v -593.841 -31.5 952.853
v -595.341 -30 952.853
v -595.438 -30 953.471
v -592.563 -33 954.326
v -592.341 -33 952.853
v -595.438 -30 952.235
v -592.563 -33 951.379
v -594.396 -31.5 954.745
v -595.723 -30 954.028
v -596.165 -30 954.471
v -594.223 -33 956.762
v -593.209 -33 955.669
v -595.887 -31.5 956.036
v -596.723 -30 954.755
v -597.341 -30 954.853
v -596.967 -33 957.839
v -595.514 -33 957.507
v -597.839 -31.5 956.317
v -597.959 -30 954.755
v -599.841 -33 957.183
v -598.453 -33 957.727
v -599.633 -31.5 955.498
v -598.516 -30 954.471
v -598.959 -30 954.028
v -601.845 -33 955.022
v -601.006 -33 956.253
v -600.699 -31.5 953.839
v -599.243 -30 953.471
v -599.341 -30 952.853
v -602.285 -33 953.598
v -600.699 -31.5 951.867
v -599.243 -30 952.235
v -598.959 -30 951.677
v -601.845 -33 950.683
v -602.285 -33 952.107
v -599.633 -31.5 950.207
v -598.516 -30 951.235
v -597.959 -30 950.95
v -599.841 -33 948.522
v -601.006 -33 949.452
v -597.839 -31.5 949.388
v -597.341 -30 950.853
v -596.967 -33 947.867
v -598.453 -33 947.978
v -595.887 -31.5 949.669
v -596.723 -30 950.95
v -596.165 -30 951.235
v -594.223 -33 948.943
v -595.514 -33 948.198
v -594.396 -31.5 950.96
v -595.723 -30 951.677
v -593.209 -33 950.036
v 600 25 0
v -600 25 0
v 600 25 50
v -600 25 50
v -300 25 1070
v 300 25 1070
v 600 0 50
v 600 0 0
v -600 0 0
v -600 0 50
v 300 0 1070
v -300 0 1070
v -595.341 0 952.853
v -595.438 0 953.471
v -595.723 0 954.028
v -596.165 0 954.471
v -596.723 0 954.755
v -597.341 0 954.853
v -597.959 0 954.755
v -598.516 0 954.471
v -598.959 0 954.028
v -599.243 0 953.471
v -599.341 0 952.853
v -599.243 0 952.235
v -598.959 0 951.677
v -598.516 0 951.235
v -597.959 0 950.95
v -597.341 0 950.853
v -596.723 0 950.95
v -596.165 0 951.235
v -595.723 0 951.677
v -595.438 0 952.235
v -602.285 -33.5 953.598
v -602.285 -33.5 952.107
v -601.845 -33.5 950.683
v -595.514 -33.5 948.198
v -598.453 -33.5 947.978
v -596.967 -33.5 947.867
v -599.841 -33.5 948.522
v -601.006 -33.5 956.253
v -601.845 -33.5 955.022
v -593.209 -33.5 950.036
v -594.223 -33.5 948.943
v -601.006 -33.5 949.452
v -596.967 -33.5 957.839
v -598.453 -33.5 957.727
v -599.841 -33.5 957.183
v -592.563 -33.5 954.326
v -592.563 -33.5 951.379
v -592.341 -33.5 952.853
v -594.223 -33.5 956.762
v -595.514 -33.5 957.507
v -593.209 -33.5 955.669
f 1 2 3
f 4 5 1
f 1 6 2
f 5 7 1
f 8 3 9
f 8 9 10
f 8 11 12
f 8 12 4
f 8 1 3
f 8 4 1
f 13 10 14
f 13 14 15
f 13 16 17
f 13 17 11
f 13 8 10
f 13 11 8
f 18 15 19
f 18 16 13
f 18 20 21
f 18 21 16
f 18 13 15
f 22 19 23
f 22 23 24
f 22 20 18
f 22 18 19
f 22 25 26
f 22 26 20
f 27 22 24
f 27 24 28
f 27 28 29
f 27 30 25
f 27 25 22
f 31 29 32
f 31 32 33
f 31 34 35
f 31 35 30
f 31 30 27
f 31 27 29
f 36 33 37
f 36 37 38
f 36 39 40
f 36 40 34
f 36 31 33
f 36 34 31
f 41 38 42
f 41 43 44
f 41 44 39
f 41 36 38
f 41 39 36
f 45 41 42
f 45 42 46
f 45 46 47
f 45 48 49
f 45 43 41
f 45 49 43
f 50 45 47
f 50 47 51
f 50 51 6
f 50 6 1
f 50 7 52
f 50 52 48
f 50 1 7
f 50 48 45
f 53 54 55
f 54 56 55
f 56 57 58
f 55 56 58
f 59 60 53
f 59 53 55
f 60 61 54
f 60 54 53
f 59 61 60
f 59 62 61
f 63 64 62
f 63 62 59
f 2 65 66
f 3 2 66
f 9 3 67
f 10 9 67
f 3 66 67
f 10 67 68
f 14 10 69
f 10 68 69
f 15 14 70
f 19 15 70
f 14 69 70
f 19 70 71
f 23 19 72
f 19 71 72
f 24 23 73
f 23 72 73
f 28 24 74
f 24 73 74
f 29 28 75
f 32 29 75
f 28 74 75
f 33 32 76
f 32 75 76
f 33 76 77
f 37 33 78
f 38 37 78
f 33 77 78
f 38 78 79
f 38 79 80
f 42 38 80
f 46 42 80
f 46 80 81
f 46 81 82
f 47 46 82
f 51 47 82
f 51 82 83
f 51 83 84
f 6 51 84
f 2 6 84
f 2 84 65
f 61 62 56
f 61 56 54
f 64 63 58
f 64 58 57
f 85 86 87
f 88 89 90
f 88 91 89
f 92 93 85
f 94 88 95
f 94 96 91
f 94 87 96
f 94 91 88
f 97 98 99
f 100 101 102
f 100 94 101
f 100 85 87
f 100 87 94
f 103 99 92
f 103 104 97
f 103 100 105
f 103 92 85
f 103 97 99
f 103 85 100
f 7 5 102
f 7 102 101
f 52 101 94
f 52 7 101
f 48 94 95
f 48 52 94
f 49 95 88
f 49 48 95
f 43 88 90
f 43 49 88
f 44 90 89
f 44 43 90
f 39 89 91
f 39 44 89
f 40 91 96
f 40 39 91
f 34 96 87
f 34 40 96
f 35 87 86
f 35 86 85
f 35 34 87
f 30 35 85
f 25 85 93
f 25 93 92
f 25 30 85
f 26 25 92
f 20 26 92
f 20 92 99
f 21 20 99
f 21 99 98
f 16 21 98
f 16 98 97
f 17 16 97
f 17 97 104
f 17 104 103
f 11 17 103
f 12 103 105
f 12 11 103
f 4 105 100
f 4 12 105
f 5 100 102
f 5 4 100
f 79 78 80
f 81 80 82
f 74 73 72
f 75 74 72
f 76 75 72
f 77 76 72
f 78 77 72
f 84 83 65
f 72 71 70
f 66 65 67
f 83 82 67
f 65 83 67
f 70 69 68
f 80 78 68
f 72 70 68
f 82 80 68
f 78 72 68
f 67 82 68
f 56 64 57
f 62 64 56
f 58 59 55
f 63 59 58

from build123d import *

# Parameters (mm, degrees)
F3_DEPTH  = 25
F2_R      = 2
F4_DEPTH  = 30
F4_FACE_R = 2
F5_DEPTH  = 3
F5_TAPER  = -45
F6_DEPTH  = 0.5


with BuildPart() as f3:
    # F2 (on Front) → F3 (new body)
    with BuildSketch(Plane.XZ):
        Polygon((-600, 0), (600, 0), (600, 50), (300, 1070), (-300, 1070), (-600, 50), align=None)
    extrude(amount=-F3_DEPTH)


with BuildPart() as f4:
    # F2 (on Front) → F4 (new body)
    with BuildSketch(Plane.XZ):
        with Locations((-597.3405838013, 952.8526067734)):
            Circle(F2_R)
    extrude(amount=F4_DEPTH)

    # F4_face (on face) → F5 (join)
    with BuildSketch(Plane(origin=(-597.3405838013, -30, 952.8526067734), x_dir=(1, 0, 0), z_dir=(0, -1, 0))):
        Circle(F4_FACE_R)
    extrude(amount=F5_DEPTH, taper=F5_TAPER)

    # F6 (add): a face of the model
    f6_faces = [f4.faces().sort_by_distance(p)[0] for p in [
        (-597.3405838013, -33, 952.8526067734),
    ]]
    extrude(f6_faces, amount=F6_DEPTH)


solid = Compound([f3.part, f4.part])
